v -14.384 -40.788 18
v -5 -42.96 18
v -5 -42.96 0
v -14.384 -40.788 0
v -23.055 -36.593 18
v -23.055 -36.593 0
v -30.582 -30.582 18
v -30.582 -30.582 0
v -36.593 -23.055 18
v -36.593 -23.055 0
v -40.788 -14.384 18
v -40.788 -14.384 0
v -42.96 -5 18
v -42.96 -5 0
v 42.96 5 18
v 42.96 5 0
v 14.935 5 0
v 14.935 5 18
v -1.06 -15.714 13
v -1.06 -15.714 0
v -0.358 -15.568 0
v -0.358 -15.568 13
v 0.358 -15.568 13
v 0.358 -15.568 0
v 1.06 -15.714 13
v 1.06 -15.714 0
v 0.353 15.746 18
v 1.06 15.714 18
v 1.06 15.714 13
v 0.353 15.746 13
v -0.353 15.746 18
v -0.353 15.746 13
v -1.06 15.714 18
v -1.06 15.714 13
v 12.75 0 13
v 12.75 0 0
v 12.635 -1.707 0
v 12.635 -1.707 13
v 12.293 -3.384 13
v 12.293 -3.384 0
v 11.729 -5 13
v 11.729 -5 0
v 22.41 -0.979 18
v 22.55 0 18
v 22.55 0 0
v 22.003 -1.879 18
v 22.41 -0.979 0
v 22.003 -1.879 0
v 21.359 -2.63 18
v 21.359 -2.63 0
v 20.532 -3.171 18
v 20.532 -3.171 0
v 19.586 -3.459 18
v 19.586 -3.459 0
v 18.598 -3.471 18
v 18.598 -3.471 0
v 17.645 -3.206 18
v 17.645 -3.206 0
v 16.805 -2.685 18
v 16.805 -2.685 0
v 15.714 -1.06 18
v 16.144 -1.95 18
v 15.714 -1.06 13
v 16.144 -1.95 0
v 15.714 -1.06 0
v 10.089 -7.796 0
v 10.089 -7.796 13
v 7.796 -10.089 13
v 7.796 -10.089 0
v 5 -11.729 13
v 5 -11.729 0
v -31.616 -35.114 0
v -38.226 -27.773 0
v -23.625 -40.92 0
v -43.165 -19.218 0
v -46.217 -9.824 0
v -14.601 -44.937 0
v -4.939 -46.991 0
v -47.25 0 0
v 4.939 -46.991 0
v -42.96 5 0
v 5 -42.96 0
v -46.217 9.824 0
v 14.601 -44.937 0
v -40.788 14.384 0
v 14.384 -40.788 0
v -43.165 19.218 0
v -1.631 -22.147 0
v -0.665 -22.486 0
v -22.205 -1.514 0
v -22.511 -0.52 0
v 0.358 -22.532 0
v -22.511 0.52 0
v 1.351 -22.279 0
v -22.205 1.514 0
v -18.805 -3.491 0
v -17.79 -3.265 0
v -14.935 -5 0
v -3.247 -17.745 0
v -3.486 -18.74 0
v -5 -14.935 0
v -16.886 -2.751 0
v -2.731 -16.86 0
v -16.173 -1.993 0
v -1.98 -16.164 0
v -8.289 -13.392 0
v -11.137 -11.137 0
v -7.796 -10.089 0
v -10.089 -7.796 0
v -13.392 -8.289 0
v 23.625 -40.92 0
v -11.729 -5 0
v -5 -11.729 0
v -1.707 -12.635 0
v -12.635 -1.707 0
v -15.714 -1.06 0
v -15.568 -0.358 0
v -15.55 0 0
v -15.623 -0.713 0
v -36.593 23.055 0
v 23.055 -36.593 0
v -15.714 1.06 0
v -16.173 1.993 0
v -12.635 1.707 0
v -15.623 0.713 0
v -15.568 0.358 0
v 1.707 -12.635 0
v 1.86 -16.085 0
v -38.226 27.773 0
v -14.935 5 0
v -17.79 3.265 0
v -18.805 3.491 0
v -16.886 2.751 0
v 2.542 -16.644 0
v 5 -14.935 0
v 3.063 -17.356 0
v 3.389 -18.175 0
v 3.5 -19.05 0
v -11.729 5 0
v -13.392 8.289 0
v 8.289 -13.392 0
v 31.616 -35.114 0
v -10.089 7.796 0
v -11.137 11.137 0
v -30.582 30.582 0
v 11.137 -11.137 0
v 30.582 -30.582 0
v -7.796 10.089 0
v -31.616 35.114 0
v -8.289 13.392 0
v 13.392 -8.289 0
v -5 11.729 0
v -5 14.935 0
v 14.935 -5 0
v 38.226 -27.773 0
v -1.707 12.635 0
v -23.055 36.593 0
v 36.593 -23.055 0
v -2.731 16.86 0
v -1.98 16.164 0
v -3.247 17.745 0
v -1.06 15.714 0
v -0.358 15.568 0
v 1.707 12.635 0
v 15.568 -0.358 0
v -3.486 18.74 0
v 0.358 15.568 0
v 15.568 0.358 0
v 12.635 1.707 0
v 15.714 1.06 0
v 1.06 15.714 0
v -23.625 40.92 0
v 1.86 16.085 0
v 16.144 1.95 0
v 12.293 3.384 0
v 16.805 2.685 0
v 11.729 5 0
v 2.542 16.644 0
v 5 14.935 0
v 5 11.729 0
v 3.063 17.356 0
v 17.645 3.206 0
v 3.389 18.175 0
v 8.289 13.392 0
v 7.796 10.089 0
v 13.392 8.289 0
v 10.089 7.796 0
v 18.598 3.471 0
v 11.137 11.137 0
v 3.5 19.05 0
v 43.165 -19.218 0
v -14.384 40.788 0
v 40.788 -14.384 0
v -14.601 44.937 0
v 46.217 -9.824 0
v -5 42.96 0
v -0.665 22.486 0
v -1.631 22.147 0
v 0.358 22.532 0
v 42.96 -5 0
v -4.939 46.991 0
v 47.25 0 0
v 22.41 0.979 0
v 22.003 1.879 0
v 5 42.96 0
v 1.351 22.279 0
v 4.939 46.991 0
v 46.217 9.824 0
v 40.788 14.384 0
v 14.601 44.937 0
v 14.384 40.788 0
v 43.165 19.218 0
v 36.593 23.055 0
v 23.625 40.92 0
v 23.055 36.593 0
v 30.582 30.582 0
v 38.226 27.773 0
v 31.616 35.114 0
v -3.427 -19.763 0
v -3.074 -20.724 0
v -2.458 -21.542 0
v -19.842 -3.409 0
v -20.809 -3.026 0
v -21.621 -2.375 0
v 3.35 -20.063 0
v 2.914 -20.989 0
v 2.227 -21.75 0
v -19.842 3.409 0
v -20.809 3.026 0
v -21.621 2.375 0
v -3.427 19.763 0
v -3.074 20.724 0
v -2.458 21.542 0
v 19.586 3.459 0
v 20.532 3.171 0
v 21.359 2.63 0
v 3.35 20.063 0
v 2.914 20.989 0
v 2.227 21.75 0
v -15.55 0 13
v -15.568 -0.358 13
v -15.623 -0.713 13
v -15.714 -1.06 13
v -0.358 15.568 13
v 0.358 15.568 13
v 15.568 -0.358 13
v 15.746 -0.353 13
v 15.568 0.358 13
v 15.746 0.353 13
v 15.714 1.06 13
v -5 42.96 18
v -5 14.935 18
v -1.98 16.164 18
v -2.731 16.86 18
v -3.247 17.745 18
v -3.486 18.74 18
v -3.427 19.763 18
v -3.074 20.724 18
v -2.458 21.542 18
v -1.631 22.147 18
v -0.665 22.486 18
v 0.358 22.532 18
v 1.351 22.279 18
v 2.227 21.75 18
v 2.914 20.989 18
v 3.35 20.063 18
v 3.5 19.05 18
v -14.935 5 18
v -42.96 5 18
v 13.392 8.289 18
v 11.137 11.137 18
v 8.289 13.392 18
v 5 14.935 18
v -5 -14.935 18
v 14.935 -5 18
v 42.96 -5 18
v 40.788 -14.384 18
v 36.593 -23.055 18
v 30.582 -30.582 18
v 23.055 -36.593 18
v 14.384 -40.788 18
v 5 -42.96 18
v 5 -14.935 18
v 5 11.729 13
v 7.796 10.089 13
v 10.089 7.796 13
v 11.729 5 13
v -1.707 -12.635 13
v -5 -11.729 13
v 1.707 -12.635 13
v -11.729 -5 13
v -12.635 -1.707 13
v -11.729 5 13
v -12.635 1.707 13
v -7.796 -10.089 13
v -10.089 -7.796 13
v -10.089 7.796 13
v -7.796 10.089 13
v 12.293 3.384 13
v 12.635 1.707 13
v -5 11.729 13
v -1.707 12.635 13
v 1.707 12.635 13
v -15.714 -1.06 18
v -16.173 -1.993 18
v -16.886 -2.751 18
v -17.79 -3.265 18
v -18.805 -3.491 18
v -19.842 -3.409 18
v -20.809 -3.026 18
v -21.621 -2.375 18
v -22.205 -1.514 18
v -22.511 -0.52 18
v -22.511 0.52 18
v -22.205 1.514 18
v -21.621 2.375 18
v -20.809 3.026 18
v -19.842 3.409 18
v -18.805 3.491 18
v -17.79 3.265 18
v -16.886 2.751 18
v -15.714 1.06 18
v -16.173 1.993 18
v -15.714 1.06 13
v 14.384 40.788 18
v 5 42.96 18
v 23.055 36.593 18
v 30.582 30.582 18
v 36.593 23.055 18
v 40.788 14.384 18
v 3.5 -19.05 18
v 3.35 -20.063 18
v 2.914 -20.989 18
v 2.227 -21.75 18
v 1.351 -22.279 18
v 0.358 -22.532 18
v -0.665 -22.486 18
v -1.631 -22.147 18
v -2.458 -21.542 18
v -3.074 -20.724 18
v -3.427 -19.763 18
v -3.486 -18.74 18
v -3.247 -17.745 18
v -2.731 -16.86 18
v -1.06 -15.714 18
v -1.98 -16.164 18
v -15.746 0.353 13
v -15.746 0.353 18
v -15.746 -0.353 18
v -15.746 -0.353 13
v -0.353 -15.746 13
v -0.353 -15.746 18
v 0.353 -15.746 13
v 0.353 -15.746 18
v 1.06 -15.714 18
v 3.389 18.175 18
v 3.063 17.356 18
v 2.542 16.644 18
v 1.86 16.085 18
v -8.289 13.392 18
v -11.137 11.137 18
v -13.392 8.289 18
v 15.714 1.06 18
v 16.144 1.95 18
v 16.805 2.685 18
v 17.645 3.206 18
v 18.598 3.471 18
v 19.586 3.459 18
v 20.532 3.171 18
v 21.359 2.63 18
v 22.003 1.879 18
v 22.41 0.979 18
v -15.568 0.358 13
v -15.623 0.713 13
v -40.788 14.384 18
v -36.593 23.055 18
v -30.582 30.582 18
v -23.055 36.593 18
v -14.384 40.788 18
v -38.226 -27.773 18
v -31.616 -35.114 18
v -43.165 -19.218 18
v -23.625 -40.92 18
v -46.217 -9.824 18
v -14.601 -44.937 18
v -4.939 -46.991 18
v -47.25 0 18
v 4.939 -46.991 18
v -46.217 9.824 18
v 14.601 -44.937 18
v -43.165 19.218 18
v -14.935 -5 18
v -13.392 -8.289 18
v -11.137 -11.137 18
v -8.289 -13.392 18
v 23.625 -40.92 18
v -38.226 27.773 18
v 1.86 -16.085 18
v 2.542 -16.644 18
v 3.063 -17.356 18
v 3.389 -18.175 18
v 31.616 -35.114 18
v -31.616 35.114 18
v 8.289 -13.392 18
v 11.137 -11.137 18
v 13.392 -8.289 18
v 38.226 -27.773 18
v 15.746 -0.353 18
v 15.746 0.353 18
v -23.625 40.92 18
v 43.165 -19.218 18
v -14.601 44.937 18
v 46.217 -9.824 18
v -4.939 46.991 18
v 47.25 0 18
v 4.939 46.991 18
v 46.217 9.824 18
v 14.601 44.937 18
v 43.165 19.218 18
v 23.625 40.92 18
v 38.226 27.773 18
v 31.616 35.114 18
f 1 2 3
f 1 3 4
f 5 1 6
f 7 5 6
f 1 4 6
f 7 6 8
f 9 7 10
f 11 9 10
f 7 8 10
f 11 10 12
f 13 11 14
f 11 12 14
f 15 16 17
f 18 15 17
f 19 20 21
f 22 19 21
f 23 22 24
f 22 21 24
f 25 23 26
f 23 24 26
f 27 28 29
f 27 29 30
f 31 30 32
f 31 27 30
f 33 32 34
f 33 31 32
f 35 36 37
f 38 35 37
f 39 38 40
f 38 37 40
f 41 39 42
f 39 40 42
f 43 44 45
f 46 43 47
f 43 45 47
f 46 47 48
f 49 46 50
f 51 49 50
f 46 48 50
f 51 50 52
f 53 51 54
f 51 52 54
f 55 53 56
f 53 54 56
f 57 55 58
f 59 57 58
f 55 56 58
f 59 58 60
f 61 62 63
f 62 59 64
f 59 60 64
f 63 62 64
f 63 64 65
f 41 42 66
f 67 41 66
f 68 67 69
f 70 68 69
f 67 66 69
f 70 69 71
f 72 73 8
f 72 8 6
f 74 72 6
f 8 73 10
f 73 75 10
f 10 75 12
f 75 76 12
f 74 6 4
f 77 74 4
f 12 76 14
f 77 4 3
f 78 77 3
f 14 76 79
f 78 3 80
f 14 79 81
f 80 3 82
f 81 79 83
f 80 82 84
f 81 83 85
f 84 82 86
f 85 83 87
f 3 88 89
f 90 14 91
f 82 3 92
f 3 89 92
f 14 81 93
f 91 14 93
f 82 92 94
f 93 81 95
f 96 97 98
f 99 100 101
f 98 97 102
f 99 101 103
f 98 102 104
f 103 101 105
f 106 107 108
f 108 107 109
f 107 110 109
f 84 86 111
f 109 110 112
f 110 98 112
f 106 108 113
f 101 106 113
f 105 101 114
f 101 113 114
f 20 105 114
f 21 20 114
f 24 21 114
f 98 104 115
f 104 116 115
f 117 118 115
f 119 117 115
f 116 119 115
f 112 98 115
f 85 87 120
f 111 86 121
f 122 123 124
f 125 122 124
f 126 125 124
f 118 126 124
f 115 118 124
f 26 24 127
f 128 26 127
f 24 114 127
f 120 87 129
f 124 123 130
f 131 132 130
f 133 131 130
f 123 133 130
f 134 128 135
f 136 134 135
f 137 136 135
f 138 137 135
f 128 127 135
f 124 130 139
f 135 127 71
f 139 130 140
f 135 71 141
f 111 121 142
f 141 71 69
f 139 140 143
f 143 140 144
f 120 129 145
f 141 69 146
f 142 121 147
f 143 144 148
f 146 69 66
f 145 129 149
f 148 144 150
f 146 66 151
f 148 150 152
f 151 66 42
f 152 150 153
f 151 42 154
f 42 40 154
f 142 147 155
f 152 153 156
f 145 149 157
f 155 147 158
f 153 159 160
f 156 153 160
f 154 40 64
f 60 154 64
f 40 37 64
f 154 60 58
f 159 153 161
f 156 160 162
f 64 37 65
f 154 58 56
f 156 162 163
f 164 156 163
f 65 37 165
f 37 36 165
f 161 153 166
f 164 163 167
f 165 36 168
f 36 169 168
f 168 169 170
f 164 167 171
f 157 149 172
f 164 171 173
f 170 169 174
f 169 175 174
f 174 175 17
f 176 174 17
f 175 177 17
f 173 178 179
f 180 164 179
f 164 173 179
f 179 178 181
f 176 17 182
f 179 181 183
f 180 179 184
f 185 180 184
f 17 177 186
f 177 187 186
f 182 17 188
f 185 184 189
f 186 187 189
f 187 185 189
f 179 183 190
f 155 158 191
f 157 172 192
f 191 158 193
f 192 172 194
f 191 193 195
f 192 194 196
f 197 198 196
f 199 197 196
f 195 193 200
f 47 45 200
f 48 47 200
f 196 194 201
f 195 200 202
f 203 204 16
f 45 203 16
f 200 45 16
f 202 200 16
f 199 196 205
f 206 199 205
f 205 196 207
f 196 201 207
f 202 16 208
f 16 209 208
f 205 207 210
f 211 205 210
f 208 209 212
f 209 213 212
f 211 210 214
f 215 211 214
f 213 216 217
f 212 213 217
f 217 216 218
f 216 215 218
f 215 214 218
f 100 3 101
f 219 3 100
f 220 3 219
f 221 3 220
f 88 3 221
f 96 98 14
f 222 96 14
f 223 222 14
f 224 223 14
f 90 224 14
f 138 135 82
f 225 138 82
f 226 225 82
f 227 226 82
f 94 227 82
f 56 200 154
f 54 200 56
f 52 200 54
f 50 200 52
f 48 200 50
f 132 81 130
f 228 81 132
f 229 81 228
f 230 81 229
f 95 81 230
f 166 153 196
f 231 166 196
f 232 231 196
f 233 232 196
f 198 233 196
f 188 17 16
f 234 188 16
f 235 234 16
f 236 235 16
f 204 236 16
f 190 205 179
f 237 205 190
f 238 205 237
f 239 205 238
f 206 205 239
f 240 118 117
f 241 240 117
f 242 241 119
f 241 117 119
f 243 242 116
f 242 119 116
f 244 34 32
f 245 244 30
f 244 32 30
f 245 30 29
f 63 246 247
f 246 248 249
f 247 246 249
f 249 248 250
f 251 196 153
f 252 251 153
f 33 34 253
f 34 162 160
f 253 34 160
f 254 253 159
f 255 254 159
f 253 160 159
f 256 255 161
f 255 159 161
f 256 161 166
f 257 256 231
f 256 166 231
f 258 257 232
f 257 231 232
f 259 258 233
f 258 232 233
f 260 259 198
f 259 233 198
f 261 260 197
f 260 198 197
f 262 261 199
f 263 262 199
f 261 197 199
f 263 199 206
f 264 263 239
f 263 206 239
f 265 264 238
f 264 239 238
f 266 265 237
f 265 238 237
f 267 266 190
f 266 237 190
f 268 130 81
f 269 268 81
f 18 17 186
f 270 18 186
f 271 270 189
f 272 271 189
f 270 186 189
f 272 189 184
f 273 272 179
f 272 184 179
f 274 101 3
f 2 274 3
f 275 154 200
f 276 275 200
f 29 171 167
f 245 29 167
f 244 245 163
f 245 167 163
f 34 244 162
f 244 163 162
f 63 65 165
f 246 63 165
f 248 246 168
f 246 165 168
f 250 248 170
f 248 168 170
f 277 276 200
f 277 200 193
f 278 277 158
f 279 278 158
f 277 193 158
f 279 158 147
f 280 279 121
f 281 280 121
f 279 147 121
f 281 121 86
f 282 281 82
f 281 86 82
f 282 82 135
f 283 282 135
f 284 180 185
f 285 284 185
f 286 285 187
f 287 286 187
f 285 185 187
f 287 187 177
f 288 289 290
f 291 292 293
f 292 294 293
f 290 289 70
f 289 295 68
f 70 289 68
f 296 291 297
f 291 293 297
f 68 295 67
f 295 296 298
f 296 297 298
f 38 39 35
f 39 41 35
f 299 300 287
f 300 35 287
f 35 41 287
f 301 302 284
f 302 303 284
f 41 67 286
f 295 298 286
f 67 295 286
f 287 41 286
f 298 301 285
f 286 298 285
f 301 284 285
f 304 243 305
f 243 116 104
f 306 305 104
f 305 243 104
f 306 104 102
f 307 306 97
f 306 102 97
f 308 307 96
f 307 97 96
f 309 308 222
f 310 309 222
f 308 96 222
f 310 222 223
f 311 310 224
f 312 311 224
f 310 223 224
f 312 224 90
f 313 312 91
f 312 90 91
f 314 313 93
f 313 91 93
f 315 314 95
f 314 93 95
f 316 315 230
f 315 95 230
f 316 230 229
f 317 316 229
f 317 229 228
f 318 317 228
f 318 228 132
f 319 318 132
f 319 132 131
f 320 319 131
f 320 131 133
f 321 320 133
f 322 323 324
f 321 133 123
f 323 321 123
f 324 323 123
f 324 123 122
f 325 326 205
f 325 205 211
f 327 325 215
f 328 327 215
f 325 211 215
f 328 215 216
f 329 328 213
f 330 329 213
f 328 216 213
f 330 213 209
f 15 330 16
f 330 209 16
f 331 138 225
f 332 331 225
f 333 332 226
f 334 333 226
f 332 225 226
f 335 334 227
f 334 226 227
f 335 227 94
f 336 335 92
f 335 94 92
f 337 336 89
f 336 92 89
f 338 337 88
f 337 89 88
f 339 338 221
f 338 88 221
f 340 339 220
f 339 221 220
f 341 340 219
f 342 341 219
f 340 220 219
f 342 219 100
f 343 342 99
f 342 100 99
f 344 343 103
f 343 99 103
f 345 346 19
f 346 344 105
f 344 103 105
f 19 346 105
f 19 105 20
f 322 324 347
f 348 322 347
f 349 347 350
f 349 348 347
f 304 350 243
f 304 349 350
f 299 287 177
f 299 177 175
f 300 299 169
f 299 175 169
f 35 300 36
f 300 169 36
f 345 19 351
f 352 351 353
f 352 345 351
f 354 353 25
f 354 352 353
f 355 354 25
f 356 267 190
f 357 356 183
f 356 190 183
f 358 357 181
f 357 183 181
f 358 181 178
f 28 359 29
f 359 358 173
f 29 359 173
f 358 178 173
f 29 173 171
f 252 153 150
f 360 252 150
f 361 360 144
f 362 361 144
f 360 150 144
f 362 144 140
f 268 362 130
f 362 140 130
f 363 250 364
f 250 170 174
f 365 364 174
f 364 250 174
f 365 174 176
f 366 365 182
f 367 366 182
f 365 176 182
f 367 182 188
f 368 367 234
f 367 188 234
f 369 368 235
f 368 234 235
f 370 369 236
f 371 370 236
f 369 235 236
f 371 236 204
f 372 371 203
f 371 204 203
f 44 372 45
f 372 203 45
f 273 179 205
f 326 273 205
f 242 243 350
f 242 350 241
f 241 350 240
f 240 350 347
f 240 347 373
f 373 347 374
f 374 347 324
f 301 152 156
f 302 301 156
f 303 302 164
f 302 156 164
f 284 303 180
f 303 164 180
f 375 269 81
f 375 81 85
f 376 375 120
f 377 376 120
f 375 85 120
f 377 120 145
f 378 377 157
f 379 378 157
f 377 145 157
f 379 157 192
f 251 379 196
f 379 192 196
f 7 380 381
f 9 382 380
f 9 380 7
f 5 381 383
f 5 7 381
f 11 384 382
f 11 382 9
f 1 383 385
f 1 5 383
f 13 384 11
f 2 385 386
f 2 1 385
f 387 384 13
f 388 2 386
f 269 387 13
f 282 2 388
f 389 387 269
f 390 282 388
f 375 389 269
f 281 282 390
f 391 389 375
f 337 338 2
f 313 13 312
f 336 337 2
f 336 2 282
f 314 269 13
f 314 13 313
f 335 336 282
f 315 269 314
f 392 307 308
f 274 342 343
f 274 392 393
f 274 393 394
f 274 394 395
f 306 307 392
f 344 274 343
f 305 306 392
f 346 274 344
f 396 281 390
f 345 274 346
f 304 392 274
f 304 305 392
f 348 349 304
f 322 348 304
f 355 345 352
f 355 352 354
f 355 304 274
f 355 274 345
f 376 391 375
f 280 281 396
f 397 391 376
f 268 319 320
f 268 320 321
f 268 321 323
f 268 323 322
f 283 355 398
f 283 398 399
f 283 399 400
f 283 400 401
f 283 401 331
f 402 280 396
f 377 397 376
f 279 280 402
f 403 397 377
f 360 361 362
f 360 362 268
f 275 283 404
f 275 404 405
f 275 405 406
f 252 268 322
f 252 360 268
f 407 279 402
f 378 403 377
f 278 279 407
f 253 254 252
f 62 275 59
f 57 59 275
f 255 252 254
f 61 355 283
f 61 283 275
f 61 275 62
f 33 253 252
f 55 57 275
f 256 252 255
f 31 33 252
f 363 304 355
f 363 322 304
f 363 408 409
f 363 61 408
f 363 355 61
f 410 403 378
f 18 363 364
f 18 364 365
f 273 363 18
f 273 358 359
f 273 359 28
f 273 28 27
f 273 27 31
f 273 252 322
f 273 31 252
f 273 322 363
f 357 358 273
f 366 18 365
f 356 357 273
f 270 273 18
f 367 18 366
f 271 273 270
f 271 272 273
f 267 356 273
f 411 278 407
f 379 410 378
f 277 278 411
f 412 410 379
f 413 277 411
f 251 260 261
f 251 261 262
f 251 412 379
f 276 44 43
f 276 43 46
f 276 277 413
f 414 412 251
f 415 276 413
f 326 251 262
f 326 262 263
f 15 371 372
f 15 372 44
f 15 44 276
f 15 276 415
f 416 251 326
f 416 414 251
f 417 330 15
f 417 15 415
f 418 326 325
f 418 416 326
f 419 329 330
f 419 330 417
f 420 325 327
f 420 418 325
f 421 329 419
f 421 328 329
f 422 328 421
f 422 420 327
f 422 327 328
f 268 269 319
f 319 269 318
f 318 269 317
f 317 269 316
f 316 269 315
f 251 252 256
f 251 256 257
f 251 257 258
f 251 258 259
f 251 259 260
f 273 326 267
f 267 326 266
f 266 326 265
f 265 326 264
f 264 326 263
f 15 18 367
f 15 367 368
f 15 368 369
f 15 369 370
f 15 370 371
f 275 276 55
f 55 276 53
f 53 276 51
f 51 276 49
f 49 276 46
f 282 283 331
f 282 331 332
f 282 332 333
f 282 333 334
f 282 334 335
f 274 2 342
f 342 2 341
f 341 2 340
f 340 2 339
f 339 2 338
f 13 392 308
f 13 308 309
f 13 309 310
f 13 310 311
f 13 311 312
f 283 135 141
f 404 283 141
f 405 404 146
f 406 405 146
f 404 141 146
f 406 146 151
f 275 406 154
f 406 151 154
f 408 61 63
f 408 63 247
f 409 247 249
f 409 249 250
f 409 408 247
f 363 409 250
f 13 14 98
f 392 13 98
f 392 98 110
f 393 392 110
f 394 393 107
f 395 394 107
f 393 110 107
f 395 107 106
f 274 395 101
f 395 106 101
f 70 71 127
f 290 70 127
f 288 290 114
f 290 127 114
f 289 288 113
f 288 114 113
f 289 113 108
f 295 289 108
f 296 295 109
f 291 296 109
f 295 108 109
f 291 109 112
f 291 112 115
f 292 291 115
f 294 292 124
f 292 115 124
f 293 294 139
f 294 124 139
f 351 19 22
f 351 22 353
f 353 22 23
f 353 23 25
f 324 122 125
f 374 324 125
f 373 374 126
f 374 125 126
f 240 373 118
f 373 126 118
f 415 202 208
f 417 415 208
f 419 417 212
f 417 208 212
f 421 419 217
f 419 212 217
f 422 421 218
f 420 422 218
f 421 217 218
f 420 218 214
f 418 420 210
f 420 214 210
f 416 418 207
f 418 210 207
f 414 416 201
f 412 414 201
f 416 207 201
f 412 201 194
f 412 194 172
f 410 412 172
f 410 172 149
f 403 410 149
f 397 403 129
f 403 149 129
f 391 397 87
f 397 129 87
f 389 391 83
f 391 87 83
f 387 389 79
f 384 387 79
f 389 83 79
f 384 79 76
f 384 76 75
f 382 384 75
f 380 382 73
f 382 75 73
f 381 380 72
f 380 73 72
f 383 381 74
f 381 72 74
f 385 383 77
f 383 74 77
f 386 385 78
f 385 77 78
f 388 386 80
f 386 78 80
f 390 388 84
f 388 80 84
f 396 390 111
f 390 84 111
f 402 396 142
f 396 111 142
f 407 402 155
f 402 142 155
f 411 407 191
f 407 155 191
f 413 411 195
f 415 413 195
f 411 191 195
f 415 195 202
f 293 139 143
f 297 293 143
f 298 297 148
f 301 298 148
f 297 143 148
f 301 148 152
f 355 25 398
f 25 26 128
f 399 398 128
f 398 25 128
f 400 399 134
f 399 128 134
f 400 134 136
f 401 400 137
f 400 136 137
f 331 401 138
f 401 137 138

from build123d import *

# Parameters (mm, degrees)
F0_R     = 47.25
F1_DEPTH = 18
F2_R     = 15.75
F3_DEPTH = 5


with BuildPart() as f1:
    # F0 (on Top) → F1 (new body)
    with BuildSketch(Plane.XY):
        Circle(F0_R)
        with BuildLine():
            ThreePointArc((5, 42.9600104749), (30.5823682863, 30.5823682863), (42.9600104749, 5))
            ThreePointArc((42.9600104749, 5), (43.1774417551, 2.5042011663), (43.25, 0))
            ThreePointArc((43.25, 0), (43.1774417551, -2.5042011663), (42.9600104749, -5))
            ThreePointArc((42.9600104749, -5), (30.5823682863, -30.5823682863), (5, -42.9600104749))
            ThreePointArc((5, -42.9600104749), (0, -43.25), (-5, -42.9600104749))
            ThreePointArc((-5, -42.9600104749), (-30.5823682863, -30.5823682863), (-42.9600104749, -5))
            ThreePointArc((-42.9600104749, -5), (-43.25, 0), (-42.9600104749, 5))
            ThreePointArc((-42.9600104749, 5), (-30.5823682863, 30.5823682863), (-5, 42.9600104749))
            ThreePointArc((-5, 42.9600104749), (0, 43.25), (5, 42.9600104749))
        make_face(mode=Mode.SUBTRACT)
        with BuildLine():
            Line((42.9600104749, 5), (14.9352770312, 5))
            ThreePointArc((14.9352770312, 5), (15.4509075243, 3.0548251464), (15.7143044619, 1.0597807685))
            ThreePointArc((15.7143044619, 1.0597807685), (19.5862208579, 3.4586799782), (22.55, 0))
            ThreePointArc((22.55, 0), (19.5862208579, -3.4586799782), (15.7143044619, -1.0597807685))
            ThreePointArc((15.7143044619, -1.0597807685), (15.4509075243, -3.0548251464), (14.9352770312, -5))
            Line((14.9352770312, -5), (42.9600104749, -5))
            ThreePointArc((42.9600104749, -5), (43.1774417551, -2.5042011663), (43.25, 0))
            ThreePointArc((43.25, 0), (43.1774417551, 2.5042011663), (42.9600104749, 5))
        make_face()
        with BuildLine():
            ThreePointArc((-15.7143044619, 1.0597807685), (-15.4509075243, 3.0548251464), (-14.9352770312, 5))
            Line((-14.9352770312, 5), (-42.9600104749, 5))
            ThreePointArc((-42.9600104749, 5), (-43.25, 0), (-42.9600104749, -5))
            Line((-42.9600104749, -5), (-14.9352770312, -5))
            ThreePointArc((-14.9352770312, -5), (-15.4509075243, -3.0548251464), (-15.7143044619, -1.0597807685))
            ThreePointArc((-15.7143044619, -1.0597807685), (-22.55, 0), (-15.7143044619, 1.0597807685))
        make_face()
        with BuildLine():
            ThreePointArc((1.0597807685, 15.7143044619), (3.0548251464, 15.4509075243), (5, 14.9352770312))
            Line((5, 14.9352770312), (5, 42.9600104749))
            ThreePointArc((5, 42.9600104749), (0, 43.25), (-5, 42.9600104749))
            Line((-5, 42.9600104749), (-5, 14.9352770312))
            ThreePointArc((-5, 14.9352770312), (-3.0548251464, 15.4509075243), (-1.0597807685, 15.7143044619))
            ThreePointArc((-1.0597807685, 15.7143044619), (-2.0664906617, 21.8748214713), (3.5, 19.05))
            ThreePointArc((3.5, 19.05), (2.8248214713, 16.9835093383), (1.0597807685, 15.7143044619))
        make_face()
        with BuildLine():
            Line((5, -42.9600104749), (5, -14.9352770312))
            ThreePointArc((5, -14.9352770312), (3.0548251464, -15.4509075243), (1.0597807685, -15.7143044619))
            ThreePointArc((1.0597807685, -15.7143044619), (2.8248214713, -16.9835093383), (3.5, -19.05))
            ThreePointArc((3.5, -19.05), (-2.0664906617, -21.8748214713), (-1.0597807685, -15.7143044619))
            ThreePointArc((-1.0597807685, -15.7143044619), (-3.0548251464, -15.4509075243), (-5, -14.9352770312))
            Line((-5, -14.9352770312), (-5, -42.9600104749))
            ThreePointArc((-5, -42.9600104749), (0, -43.25), (5, -42.9600104749))
        make_face()
        with BuildLine():
            Line((-5, -14.9352770312), (-5, -11.7287041057))
            ThreePointArc((-5, -11.7287041057), (-9.0156114601, -9.0156114601), (-11.7287041057, -5))
            Line((-11.7287041057, -5), (-14.9352770312, -5))
            ThreePointArc((-14.9352770312, -5), (-11.1369318037, -11.1369318037), (-5, -14.9352770312))
        make_face()
        with BuildLine():
            Line((14.9352770312, -5), (11.7287041057, -5))
            ThreePointArc((11.7287041057, -5), (9.0156114601, -9.0156114601), (5, -11.7287041057))
            Line((5, -11.7287041057), (5, -14.9352770312))
            ThreePointArc((5, -14.9352770312), (11.1369318037, -11.1369318037), (14.9352770312, -5))
        make_face()
        with BuildLine():
            ThreePointArc((5, 11.7287041057), (9.0156114601, 9.0156114601), (11.7287041057, 5))
            Line((11.7287041057, 5), (14.9352770312, 5))
            ThreePointArc((14.9352770312, 5), (11.1369318037, 11.1369318037), (5, 14.9352770312))
            Line((5, 14.9352770312), (5, 11.7287041057))
        make_face()
        with BuildLine():
            ThreePointArc((-11.7287041057, 5), (-9.0156114601, 9.0156114601), (-5, 11.7287041057))
            Line((-5, 11.7287041057), (-5, 14.9352770312))
            ThreePointArc((-5, 14.9352770312), (-11.1369318037, 11.1369318037), (-14.9352770312, 5))
            Line((-14.9352770312, 5), (-11.7287041057, 5))
        make_face()
        with BuildLine():
            ThreePointArc((-5, 11.7287041057), (0, 12.75), (5, 11.7287041057))
            Line((5, 11.7287041057), (5, 14.9352770312))
            ThreePointArc((5, 14.9352770312), (3.0548251464, 15.4509075243), (1.0597807685, 15.7143044619))
            ThreePointArc((1.0597807685, 15.7143044619), (0, 15.55), (-1.0597807685, 15.7143044619))
            ThreePointArc((-1.0597807685, 15.7143044619), (-3.0548251464, 15.4509075243), (-5, 14.9352770312))
            Line((-5, 14.9352770312), (-5, 11.7287041057))
        make_face()
        with BuildLine():
            ThreePointArc((11.7287041057, 5), (12.4920670297, 2.5516193536), (12.75, 0))
            ThreePointArc((12.75, 0), (12.4920670297, -2.5516193536), (11.7287041057, -5))
            Line((11.7287041057, -5), (14.9352770312, -5))
            ThreePointArc((14.9352770312, -5), (15.4509075243, -3.0548251464), (15.7143044619, -1.0597807685))
            ThreePointArc((15.7143044619, -1.0597807685), (15.55, 0), (15.7143044619, 1.0597807685))
            ThreePointArc((15.7143044619, 1.0597807685), (15.4509075243, 3.0548251464), (14.9352770312, 5))
            Line((14.9352770312, 5), (11.7287041057, 5))
        make_face()
        with BuildLine():
            ThreePointArc((-11.7287041057, -5), (-12.75, 0), (-11.7287041057, 5))
            Line((-11.7287041057, 5), (-14.9352770312, 5))
            ThreePointArc((-14.9352770312, 5), (-15.4509075243, 3.0548251464), (-15.7143044619, 1.0597807685))
            ThreePointArc((-15.7143044619, 1.0597807685), (-15.5913200218, 0.5362208579), (-15.55, 0))
            ThreePointArc((-15.55, 0), (-15.5913200218, -0.5362208579), (-15.7143044619, -1.0597807685))
            ThreePointArc((-15.7143044619, -1.0597807685), (-15.4509075243, -3.0548251464), (-14.9352770312, -5))
            Line((-14.9352770312, -5), (-11.7287041057, -5))
        make_face()
        with BuildLine():
            Line((5, -14.9352770312), (5, -11.7287041057))
            ThreePointArc((5, -11.7287041057), (0, -12.75), (-5, -11.7287041057))
            Line((-5, -11.7287041057), (-5, -14.9352770312))
            ThreePointArc((-5, -14.9352770312), (-3.0548251464, -15.4509075243), (-1.0597807685, -15.7143044619))
            ThreePointArc((-1.0597807685, -15.7143044619), (0, -15.55), (1.0597807685, -15.7143044619))
            ThreePointArc((1.0597807685, -15.7143044619), (3.0548251464, -15.4509075243), (5, -14.9352770312))
        make_face()
    extrude(amount=F1_DEPTH)

    # F2 (on face) → F3 (join)
    with BuildSketch(Plane.XY.offset(18)):
        Circle(F2_R)
    extrude(amount=-F3_DEPTH)


solid = f1.part
